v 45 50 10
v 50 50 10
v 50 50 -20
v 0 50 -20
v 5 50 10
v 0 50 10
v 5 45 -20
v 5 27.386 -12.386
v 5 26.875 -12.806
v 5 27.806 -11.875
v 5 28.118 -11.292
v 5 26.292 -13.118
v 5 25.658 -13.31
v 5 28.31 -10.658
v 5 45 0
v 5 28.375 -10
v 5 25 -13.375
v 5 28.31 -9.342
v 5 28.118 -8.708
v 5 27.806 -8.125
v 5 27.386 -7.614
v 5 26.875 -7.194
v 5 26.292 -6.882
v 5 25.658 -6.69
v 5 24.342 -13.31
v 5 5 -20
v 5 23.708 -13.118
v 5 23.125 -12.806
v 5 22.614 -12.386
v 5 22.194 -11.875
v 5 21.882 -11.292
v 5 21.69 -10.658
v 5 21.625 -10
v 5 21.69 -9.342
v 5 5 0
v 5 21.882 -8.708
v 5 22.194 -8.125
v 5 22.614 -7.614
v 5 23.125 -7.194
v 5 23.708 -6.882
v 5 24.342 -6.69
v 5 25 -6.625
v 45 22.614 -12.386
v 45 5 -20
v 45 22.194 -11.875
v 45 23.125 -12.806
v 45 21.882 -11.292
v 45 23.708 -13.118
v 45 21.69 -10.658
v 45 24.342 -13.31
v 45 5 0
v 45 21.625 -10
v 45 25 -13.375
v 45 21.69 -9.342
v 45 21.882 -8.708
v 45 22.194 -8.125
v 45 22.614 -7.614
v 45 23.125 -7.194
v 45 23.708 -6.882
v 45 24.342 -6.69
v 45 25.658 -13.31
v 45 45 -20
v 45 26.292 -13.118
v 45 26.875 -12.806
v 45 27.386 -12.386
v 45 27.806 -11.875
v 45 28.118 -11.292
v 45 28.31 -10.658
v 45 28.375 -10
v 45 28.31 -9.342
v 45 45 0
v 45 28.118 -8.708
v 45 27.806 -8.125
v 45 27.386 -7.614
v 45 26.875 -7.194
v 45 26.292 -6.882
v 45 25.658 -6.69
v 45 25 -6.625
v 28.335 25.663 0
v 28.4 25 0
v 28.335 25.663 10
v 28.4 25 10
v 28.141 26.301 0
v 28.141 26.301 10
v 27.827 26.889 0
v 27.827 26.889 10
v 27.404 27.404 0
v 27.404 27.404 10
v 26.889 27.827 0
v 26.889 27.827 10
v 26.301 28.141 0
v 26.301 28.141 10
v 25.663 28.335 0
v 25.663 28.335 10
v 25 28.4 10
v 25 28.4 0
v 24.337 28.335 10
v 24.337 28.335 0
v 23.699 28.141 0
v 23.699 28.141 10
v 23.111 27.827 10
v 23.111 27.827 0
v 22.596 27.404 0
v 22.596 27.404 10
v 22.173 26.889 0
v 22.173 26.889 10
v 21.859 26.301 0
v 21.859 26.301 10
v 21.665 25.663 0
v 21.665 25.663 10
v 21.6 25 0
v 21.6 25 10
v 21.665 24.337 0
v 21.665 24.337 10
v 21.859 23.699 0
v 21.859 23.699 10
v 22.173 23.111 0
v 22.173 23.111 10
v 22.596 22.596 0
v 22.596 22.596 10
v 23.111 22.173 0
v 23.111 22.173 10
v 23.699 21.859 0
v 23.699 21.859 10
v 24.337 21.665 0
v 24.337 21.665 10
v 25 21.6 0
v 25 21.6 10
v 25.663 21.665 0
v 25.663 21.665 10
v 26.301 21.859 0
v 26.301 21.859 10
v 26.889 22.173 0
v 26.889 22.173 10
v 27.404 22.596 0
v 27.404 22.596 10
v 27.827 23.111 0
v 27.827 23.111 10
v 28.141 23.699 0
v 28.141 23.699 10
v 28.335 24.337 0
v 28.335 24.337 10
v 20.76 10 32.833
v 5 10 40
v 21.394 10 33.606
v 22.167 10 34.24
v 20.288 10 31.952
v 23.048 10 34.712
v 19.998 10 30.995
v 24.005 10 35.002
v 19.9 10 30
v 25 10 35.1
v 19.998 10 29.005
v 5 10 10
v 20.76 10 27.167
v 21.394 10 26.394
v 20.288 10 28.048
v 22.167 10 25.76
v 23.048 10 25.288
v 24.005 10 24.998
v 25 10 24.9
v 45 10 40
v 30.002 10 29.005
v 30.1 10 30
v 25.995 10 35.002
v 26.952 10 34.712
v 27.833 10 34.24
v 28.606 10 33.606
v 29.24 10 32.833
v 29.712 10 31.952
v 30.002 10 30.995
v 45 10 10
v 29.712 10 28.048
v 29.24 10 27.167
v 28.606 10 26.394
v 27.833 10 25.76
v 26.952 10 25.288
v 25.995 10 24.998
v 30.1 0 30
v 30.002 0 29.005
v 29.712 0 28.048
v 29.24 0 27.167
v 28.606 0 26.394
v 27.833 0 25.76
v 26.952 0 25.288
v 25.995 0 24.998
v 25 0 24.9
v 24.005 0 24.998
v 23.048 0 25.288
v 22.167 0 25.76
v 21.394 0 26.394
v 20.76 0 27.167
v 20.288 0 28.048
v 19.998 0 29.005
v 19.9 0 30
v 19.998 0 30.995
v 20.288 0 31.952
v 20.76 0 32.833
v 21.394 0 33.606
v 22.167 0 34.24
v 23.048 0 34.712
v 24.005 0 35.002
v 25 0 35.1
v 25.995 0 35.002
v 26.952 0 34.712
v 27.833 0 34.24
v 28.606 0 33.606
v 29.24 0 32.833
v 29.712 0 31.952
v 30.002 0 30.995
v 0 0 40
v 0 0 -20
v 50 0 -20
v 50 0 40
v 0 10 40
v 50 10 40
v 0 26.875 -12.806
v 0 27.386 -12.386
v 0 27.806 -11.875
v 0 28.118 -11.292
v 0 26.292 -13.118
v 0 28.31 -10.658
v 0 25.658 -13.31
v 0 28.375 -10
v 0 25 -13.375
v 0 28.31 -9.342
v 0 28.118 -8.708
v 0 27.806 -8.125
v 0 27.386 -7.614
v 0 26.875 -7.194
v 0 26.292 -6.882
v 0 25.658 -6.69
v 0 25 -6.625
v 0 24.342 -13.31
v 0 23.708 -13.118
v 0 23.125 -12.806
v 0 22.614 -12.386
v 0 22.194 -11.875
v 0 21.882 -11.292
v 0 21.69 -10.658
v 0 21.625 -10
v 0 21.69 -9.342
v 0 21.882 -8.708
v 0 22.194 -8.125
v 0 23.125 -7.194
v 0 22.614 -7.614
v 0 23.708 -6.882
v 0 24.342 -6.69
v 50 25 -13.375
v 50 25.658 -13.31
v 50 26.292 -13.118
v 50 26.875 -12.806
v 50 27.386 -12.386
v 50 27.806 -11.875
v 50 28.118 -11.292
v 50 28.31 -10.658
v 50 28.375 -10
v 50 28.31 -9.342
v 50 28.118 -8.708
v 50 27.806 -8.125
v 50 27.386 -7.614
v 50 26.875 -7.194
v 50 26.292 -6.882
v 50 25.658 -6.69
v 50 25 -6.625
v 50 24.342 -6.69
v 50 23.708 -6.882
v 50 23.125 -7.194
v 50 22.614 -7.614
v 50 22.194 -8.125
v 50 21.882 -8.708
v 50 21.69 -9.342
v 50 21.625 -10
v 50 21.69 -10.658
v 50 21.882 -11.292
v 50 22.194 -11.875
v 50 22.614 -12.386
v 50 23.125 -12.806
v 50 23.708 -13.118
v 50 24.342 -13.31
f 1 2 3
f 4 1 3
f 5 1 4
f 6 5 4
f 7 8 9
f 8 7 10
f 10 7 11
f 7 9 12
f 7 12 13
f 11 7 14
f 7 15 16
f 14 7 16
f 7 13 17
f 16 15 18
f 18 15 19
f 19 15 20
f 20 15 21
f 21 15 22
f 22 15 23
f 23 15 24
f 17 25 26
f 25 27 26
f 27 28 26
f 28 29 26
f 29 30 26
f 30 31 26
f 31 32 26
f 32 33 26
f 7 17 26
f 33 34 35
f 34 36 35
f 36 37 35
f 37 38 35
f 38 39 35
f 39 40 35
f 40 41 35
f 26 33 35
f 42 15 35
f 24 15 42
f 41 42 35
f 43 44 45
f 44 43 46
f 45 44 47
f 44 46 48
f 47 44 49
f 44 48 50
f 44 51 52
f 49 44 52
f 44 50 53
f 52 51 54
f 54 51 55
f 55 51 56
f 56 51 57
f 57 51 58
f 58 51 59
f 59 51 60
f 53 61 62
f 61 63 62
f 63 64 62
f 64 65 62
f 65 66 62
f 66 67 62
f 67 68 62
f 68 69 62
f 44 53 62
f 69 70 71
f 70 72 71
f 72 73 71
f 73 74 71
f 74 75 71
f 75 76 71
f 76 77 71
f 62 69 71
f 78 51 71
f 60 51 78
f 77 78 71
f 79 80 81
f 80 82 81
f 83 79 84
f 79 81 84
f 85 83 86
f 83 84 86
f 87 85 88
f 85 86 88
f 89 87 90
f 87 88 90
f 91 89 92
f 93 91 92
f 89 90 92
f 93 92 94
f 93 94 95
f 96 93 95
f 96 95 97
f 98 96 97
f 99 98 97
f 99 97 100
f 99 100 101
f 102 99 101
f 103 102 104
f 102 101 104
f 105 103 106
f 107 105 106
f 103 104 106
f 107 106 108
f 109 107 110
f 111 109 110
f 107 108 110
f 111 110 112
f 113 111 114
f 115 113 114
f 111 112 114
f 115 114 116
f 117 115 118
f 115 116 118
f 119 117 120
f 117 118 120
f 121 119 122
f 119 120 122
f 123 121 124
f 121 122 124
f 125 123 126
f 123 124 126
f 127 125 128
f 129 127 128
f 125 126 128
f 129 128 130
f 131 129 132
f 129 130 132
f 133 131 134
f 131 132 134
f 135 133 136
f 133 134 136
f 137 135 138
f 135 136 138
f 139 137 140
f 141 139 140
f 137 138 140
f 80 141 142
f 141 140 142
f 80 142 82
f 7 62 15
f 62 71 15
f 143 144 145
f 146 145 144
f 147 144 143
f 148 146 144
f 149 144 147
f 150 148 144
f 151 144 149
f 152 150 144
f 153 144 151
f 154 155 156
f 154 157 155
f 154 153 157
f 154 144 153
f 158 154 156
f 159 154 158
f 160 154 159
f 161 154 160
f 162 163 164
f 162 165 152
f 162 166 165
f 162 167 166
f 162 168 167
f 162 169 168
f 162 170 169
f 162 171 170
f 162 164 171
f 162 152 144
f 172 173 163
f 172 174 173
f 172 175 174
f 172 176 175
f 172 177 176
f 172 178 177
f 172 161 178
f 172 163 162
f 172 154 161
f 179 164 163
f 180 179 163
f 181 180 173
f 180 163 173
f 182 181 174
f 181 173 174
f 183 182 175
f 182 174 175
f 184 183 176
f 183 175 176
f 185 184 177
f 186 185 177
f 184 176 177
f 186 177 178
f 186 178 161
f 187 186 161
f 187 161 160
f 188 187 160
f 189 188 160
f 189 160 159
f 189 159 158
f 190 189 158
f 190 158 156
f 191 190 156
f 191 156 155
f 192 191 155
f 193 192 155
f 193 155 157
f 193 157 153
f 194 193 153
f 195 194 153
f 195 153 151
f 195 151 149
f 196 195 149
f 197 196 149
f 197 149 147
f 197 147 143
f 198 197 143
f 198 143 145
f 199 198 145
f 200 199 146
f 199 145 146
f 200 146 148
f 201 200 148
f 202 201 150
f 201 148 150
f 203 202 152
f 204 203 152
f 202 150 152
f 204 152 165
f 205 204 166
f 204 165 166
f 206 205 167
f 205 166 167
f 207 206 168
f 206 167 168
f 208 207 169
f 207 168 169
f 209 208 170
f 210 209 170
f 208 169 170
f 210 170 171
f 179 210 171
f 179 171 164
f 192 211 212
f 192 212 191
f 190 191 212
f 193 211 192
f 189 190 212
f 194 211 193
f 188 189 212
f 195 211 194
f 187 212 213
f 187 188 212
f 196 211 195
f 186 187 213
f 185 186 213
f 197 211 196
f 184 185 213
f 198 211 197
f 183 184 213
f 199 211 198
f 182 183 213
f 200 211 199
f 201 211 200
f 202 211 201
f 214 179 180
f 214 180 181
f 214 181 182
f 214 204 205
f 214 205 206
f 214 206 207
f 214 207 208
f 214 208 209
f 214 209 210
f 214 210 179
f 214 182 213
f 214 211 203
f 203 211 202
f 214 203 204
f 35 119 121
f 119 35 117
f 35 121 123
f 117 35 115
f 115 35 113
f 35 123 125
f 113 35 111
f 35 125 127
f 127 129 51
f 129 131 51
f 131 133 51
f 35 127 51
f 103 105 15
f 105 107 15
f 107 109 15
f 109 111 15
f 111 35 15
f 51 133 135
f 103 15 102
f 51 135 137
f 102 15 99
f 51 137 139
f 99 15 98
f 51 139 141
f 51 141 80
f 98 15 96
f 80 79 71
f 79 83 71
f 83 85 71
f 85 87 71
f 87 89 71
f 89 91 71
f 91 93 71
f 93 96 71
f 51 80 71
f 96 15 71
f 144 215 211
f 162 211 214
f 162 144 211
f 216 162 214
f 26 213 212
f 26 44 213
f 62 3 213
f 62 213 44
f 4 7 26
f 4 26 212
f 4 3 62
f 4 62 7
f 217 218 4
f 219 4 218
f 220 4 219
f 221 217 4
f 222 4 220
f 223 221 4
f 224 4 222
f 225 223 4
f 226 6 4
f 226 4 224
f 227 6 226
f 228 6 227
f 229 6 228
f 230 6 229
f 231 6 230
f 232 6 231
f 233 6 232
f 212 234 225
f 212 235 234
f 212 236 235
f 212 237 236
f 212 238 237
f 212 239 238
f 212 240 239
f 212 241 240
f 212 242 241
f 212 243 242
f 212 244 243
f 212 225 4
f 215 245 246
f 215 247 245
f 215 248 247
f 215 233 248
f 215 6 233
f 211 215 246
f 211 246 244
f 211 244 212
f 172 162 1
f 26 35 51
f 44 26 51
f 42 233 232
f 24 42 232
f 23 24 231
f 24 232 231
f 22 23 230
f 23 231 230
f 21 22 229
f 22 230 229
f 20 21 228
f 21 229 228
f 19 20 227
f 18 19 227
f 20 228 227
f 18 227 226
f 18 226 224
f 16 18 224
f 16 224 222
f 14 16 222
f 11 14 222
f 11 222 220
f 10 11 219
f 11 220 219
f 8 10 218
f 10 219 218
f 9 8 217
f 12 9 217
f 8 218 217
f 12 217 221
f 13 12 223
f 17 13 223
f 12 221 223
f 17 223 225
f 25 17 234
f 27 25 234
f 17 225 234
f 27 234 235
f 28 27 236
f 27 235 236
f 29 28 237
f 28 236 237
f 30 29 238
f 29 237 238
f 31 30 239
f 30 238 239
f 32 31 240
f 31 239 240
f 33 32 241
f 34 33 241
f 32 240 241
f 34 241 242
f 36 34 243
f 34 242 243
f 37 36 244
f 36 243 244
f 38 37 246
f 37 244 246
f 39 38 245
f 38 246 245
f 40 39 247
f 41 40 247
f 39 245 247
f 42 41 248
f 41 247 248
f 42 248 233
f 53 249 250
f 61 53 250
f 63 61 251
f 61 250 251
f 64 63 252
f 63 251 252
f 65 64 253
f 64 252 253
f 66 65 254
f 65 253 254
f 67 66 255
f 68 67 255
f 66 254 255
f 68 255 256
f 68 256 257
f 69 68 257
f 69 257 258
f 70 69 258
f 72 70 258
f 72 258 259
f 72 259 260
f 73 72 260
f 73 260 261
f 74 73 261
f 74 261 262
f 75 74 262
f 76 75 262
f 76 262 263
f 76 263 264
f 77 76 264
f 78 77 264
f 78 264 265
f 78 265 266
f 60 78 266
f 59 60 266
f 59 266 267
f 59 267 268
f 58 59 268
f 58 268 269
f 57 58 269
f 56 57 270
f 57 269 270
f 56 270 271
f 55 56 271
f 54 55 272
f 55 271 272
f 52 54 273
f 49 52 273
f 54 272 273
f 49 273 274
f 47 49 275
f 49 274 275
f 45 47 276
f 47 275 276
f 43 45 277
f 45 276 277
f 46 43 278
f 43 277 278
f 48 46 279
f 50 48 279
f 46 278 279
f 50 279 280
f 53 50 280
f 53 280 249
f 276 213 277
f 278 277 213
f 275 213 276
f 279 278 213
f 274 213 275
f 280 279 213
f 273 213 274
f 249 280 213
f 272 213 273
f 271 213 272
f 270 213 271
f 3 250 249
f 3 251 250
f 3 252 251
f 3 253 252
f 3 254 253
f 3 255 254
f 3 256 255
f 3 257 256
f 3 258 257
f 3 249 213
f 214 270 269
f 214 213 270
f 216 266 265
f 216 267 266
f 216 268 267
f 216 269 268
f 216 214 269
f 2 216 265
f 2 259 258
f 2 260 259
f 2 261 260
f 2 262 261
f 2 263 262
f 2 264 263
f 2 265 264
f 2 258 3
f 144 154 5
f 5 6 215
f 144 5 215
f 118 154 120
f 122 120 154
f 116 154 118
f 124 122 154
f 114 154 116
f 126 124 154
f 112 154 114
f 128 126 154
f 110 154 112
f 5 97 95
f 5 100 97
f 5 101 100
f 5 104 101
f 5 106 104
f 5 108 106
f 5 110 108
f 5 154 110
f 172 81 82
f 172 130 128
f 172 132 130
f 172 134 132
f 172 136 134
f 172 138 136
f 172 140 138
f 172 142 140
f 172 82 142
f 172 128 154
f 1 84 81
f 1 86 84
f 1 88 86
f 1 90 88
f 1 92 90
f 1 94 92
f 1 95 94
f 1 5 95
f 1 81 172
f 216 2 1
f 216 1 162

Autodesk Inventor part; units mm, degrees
ref_plane "YZ Plane" through (0, 0, 0) normal (1, 0, 0) x (0, 1, 0)
ref_plane "XZ Plane" through (0, 0, 0) normal (0, 1, 0) x (-1, 0, 0)
ref_plane "XY Plane" through (0, 0, 0) normal (0, 0, 1) x (1, 0, 0)
sketch "Boceto1" plane through (0, 0, 0) normal (0, 0, 1) x (1, 0, 0)
  line L0 (0, 0) -> (50, 0)
  line L1 (50, 0) -> (50, 50)
  line L2 (50, 50) -> (0, 50)
  line L3 (0, 50) -> (0, 0)
  line L4 (50, 0) -> (0, 0)
  line L5 (0, 0) -> (0, 10)
  line L6 (0, 10) -> (50, 10)
  line L7 (50, 10) -> (50, 0)
  dimension "d0" = 50
  dimension "d1" = 50
  dimension "d2" = 10
extrude "Extrusión1" add sketch "Boceto1" along normal blind 10
sketch "Boceto2" plane through (0, 0, 10) normal (0, 0, 1) x (1, 0, 0)
  line L0 (0, 0) -> (50, 0) projected
  line L1 (0, 50) -> (0, 0) projected
  line L2 (50, 0) -> (0, 0)
  line L3 (0, 0) -> (0, 10)
  line L4 (0, 10) -> (50, 10)
  line L5 (50, 10) -> (50, 0)
  dimension "d5" = 10
extrude "Extrusión2" add sketch "Boceto2" along normal blind 30
sketch "Boceto3" plane through (0, 0, 10) normal (0, 0, 1) x (1, 0, 0)
  circle A0 centre (25, 25) radius 3.4
  line L0 (0, 50) -> (0, 10) projected
  line L1 (0, 0) -> (50, 0) projected
  dimension "d8" = 6.8
  dimension "d9" = 25
  dimension "d10" = 25
extrude "Extrusión3" cut sketch "Boceto3" against normal blind 10
sketch "Boceto4" plane through (0, 10, 10) normal (0, 1, 0) x (1, 0, 0)
  circle A0 centre (25, -20) radius 5.1
  line L0 (50, 10) -> (0, 10) projected
  line L1 (0, 0) -> (0, -30) projected
  dimension "d13" = 10.2
  dimension "d14" = 30
  dimension "d15" = 25
extrude "Extrusión4" cut sketch "Boceto4" against normal blind 10
sketch "Boceto5" plane through (0, 0, 0) normal (-1, 0, 0) x (0, 0, 1)
  line L0 (0, 50) -> (10, 50) projected
  line L1 (10, 10) -> (40, 10) projected
  line L2 (10, 50) -> (40, 10)
  line L3 (40, 10) -> (10, 10)
  line L4 (10, 10) -> (10, 50)
  line L5 (10, 50) -> (10, 10) projected
  point P0 (0, 0)
extrude "Extrusión5" add sketch "Boceto5" against normal blind 5
sketch "Boceto6" plane through (50, 0, 0) normal (1, 0, 0) x (0, 0, -1)
  line L0 (-10, 50) -> (-40, 10) projected
  line L1 (-10, 10) -> (-40, 10) projected
  line L2 (-10, 50) -> (-40, 10)
  line L3 (-40, 10) -> (-10, 10)
  line L4 (-10, 50) -> (-10, 10) projected
  line L5 (-10, 10) -> (-10, 50)
  point P0 (0, 0)
sketch "Boceto7" plane through (50, 0, 0) normal (1, 0, 0) x (0, 0, -1)
  point P0 (0, 0)
sketch "Boceto8" plane through (0, 0, 10) normal (0, 0, 1) x (1, 0, 0)
  point P0 (0, 0)
extrude "Extrusión6" add sketch "Boceto6" against normal blind 5
sketch "Boceto9" plane through (0, 0, 0) normal (0, 0, -1) x (-1, 0, 0)
  line L0 (-5, 5) -> (-45, 5)
  line L1 (-45, 5) -> (-45, 45)
  line L2 (-45, 45) -> (-5, 45)
  line L3 (-5, 45) -> (-5, 5)
  line L4 (-50, 0) -> (-50, 50) projected
  line L5 (-50, 50) -> (0, 50) projected
  line L6 (0, 50) -> (0, 0) projected
  line L7 (0, 0) -> (-50, 0)
  line L8 (-50, 0) -> (-50, 50)
  line L9 (-50, 50) -> (0, 50)
  line L10 (0, 50) -> (0, 0)
extrude "Extrusión7" add sketch "Boceto9" along normal blind 20
sketch "Boceto10" plane through (50, 0, 40) normal (1, 0, 0) x (0, 0, -1)
  line L0 (0, 0) -> (0, 10) projected
  circle A0 centre (50, 25) radius 3.375
  line L1 (60, 0) -> (0, 0) projected
  line L2 (60, 50) -> (60, 0) projected
  point P0 (40, 0)
  dimension "d28" = 40
  dimension "d29" = 6.75
sketch "Boceto12" plane through (0, 0, 40) normal (-1, 0, 0) x (0, 0, 1)
  circle A0 centre (-50, 25) radius 3.375
  line L0 (-60, 0) -> (-60, 50) projected
  line L1 (-30, 50) -> (-60, 50) projected
  point P0 (-40, 0)
  dimension "d35" = 6.75
extrude "Extrusión9" cut sketch "Boceto10" against normal blind 5
extrude "Extrusión11" cut sketch "Boceto12" against normal blind 5
properties part number "UnionLlantaOmega2" material "Plástico ABS"
